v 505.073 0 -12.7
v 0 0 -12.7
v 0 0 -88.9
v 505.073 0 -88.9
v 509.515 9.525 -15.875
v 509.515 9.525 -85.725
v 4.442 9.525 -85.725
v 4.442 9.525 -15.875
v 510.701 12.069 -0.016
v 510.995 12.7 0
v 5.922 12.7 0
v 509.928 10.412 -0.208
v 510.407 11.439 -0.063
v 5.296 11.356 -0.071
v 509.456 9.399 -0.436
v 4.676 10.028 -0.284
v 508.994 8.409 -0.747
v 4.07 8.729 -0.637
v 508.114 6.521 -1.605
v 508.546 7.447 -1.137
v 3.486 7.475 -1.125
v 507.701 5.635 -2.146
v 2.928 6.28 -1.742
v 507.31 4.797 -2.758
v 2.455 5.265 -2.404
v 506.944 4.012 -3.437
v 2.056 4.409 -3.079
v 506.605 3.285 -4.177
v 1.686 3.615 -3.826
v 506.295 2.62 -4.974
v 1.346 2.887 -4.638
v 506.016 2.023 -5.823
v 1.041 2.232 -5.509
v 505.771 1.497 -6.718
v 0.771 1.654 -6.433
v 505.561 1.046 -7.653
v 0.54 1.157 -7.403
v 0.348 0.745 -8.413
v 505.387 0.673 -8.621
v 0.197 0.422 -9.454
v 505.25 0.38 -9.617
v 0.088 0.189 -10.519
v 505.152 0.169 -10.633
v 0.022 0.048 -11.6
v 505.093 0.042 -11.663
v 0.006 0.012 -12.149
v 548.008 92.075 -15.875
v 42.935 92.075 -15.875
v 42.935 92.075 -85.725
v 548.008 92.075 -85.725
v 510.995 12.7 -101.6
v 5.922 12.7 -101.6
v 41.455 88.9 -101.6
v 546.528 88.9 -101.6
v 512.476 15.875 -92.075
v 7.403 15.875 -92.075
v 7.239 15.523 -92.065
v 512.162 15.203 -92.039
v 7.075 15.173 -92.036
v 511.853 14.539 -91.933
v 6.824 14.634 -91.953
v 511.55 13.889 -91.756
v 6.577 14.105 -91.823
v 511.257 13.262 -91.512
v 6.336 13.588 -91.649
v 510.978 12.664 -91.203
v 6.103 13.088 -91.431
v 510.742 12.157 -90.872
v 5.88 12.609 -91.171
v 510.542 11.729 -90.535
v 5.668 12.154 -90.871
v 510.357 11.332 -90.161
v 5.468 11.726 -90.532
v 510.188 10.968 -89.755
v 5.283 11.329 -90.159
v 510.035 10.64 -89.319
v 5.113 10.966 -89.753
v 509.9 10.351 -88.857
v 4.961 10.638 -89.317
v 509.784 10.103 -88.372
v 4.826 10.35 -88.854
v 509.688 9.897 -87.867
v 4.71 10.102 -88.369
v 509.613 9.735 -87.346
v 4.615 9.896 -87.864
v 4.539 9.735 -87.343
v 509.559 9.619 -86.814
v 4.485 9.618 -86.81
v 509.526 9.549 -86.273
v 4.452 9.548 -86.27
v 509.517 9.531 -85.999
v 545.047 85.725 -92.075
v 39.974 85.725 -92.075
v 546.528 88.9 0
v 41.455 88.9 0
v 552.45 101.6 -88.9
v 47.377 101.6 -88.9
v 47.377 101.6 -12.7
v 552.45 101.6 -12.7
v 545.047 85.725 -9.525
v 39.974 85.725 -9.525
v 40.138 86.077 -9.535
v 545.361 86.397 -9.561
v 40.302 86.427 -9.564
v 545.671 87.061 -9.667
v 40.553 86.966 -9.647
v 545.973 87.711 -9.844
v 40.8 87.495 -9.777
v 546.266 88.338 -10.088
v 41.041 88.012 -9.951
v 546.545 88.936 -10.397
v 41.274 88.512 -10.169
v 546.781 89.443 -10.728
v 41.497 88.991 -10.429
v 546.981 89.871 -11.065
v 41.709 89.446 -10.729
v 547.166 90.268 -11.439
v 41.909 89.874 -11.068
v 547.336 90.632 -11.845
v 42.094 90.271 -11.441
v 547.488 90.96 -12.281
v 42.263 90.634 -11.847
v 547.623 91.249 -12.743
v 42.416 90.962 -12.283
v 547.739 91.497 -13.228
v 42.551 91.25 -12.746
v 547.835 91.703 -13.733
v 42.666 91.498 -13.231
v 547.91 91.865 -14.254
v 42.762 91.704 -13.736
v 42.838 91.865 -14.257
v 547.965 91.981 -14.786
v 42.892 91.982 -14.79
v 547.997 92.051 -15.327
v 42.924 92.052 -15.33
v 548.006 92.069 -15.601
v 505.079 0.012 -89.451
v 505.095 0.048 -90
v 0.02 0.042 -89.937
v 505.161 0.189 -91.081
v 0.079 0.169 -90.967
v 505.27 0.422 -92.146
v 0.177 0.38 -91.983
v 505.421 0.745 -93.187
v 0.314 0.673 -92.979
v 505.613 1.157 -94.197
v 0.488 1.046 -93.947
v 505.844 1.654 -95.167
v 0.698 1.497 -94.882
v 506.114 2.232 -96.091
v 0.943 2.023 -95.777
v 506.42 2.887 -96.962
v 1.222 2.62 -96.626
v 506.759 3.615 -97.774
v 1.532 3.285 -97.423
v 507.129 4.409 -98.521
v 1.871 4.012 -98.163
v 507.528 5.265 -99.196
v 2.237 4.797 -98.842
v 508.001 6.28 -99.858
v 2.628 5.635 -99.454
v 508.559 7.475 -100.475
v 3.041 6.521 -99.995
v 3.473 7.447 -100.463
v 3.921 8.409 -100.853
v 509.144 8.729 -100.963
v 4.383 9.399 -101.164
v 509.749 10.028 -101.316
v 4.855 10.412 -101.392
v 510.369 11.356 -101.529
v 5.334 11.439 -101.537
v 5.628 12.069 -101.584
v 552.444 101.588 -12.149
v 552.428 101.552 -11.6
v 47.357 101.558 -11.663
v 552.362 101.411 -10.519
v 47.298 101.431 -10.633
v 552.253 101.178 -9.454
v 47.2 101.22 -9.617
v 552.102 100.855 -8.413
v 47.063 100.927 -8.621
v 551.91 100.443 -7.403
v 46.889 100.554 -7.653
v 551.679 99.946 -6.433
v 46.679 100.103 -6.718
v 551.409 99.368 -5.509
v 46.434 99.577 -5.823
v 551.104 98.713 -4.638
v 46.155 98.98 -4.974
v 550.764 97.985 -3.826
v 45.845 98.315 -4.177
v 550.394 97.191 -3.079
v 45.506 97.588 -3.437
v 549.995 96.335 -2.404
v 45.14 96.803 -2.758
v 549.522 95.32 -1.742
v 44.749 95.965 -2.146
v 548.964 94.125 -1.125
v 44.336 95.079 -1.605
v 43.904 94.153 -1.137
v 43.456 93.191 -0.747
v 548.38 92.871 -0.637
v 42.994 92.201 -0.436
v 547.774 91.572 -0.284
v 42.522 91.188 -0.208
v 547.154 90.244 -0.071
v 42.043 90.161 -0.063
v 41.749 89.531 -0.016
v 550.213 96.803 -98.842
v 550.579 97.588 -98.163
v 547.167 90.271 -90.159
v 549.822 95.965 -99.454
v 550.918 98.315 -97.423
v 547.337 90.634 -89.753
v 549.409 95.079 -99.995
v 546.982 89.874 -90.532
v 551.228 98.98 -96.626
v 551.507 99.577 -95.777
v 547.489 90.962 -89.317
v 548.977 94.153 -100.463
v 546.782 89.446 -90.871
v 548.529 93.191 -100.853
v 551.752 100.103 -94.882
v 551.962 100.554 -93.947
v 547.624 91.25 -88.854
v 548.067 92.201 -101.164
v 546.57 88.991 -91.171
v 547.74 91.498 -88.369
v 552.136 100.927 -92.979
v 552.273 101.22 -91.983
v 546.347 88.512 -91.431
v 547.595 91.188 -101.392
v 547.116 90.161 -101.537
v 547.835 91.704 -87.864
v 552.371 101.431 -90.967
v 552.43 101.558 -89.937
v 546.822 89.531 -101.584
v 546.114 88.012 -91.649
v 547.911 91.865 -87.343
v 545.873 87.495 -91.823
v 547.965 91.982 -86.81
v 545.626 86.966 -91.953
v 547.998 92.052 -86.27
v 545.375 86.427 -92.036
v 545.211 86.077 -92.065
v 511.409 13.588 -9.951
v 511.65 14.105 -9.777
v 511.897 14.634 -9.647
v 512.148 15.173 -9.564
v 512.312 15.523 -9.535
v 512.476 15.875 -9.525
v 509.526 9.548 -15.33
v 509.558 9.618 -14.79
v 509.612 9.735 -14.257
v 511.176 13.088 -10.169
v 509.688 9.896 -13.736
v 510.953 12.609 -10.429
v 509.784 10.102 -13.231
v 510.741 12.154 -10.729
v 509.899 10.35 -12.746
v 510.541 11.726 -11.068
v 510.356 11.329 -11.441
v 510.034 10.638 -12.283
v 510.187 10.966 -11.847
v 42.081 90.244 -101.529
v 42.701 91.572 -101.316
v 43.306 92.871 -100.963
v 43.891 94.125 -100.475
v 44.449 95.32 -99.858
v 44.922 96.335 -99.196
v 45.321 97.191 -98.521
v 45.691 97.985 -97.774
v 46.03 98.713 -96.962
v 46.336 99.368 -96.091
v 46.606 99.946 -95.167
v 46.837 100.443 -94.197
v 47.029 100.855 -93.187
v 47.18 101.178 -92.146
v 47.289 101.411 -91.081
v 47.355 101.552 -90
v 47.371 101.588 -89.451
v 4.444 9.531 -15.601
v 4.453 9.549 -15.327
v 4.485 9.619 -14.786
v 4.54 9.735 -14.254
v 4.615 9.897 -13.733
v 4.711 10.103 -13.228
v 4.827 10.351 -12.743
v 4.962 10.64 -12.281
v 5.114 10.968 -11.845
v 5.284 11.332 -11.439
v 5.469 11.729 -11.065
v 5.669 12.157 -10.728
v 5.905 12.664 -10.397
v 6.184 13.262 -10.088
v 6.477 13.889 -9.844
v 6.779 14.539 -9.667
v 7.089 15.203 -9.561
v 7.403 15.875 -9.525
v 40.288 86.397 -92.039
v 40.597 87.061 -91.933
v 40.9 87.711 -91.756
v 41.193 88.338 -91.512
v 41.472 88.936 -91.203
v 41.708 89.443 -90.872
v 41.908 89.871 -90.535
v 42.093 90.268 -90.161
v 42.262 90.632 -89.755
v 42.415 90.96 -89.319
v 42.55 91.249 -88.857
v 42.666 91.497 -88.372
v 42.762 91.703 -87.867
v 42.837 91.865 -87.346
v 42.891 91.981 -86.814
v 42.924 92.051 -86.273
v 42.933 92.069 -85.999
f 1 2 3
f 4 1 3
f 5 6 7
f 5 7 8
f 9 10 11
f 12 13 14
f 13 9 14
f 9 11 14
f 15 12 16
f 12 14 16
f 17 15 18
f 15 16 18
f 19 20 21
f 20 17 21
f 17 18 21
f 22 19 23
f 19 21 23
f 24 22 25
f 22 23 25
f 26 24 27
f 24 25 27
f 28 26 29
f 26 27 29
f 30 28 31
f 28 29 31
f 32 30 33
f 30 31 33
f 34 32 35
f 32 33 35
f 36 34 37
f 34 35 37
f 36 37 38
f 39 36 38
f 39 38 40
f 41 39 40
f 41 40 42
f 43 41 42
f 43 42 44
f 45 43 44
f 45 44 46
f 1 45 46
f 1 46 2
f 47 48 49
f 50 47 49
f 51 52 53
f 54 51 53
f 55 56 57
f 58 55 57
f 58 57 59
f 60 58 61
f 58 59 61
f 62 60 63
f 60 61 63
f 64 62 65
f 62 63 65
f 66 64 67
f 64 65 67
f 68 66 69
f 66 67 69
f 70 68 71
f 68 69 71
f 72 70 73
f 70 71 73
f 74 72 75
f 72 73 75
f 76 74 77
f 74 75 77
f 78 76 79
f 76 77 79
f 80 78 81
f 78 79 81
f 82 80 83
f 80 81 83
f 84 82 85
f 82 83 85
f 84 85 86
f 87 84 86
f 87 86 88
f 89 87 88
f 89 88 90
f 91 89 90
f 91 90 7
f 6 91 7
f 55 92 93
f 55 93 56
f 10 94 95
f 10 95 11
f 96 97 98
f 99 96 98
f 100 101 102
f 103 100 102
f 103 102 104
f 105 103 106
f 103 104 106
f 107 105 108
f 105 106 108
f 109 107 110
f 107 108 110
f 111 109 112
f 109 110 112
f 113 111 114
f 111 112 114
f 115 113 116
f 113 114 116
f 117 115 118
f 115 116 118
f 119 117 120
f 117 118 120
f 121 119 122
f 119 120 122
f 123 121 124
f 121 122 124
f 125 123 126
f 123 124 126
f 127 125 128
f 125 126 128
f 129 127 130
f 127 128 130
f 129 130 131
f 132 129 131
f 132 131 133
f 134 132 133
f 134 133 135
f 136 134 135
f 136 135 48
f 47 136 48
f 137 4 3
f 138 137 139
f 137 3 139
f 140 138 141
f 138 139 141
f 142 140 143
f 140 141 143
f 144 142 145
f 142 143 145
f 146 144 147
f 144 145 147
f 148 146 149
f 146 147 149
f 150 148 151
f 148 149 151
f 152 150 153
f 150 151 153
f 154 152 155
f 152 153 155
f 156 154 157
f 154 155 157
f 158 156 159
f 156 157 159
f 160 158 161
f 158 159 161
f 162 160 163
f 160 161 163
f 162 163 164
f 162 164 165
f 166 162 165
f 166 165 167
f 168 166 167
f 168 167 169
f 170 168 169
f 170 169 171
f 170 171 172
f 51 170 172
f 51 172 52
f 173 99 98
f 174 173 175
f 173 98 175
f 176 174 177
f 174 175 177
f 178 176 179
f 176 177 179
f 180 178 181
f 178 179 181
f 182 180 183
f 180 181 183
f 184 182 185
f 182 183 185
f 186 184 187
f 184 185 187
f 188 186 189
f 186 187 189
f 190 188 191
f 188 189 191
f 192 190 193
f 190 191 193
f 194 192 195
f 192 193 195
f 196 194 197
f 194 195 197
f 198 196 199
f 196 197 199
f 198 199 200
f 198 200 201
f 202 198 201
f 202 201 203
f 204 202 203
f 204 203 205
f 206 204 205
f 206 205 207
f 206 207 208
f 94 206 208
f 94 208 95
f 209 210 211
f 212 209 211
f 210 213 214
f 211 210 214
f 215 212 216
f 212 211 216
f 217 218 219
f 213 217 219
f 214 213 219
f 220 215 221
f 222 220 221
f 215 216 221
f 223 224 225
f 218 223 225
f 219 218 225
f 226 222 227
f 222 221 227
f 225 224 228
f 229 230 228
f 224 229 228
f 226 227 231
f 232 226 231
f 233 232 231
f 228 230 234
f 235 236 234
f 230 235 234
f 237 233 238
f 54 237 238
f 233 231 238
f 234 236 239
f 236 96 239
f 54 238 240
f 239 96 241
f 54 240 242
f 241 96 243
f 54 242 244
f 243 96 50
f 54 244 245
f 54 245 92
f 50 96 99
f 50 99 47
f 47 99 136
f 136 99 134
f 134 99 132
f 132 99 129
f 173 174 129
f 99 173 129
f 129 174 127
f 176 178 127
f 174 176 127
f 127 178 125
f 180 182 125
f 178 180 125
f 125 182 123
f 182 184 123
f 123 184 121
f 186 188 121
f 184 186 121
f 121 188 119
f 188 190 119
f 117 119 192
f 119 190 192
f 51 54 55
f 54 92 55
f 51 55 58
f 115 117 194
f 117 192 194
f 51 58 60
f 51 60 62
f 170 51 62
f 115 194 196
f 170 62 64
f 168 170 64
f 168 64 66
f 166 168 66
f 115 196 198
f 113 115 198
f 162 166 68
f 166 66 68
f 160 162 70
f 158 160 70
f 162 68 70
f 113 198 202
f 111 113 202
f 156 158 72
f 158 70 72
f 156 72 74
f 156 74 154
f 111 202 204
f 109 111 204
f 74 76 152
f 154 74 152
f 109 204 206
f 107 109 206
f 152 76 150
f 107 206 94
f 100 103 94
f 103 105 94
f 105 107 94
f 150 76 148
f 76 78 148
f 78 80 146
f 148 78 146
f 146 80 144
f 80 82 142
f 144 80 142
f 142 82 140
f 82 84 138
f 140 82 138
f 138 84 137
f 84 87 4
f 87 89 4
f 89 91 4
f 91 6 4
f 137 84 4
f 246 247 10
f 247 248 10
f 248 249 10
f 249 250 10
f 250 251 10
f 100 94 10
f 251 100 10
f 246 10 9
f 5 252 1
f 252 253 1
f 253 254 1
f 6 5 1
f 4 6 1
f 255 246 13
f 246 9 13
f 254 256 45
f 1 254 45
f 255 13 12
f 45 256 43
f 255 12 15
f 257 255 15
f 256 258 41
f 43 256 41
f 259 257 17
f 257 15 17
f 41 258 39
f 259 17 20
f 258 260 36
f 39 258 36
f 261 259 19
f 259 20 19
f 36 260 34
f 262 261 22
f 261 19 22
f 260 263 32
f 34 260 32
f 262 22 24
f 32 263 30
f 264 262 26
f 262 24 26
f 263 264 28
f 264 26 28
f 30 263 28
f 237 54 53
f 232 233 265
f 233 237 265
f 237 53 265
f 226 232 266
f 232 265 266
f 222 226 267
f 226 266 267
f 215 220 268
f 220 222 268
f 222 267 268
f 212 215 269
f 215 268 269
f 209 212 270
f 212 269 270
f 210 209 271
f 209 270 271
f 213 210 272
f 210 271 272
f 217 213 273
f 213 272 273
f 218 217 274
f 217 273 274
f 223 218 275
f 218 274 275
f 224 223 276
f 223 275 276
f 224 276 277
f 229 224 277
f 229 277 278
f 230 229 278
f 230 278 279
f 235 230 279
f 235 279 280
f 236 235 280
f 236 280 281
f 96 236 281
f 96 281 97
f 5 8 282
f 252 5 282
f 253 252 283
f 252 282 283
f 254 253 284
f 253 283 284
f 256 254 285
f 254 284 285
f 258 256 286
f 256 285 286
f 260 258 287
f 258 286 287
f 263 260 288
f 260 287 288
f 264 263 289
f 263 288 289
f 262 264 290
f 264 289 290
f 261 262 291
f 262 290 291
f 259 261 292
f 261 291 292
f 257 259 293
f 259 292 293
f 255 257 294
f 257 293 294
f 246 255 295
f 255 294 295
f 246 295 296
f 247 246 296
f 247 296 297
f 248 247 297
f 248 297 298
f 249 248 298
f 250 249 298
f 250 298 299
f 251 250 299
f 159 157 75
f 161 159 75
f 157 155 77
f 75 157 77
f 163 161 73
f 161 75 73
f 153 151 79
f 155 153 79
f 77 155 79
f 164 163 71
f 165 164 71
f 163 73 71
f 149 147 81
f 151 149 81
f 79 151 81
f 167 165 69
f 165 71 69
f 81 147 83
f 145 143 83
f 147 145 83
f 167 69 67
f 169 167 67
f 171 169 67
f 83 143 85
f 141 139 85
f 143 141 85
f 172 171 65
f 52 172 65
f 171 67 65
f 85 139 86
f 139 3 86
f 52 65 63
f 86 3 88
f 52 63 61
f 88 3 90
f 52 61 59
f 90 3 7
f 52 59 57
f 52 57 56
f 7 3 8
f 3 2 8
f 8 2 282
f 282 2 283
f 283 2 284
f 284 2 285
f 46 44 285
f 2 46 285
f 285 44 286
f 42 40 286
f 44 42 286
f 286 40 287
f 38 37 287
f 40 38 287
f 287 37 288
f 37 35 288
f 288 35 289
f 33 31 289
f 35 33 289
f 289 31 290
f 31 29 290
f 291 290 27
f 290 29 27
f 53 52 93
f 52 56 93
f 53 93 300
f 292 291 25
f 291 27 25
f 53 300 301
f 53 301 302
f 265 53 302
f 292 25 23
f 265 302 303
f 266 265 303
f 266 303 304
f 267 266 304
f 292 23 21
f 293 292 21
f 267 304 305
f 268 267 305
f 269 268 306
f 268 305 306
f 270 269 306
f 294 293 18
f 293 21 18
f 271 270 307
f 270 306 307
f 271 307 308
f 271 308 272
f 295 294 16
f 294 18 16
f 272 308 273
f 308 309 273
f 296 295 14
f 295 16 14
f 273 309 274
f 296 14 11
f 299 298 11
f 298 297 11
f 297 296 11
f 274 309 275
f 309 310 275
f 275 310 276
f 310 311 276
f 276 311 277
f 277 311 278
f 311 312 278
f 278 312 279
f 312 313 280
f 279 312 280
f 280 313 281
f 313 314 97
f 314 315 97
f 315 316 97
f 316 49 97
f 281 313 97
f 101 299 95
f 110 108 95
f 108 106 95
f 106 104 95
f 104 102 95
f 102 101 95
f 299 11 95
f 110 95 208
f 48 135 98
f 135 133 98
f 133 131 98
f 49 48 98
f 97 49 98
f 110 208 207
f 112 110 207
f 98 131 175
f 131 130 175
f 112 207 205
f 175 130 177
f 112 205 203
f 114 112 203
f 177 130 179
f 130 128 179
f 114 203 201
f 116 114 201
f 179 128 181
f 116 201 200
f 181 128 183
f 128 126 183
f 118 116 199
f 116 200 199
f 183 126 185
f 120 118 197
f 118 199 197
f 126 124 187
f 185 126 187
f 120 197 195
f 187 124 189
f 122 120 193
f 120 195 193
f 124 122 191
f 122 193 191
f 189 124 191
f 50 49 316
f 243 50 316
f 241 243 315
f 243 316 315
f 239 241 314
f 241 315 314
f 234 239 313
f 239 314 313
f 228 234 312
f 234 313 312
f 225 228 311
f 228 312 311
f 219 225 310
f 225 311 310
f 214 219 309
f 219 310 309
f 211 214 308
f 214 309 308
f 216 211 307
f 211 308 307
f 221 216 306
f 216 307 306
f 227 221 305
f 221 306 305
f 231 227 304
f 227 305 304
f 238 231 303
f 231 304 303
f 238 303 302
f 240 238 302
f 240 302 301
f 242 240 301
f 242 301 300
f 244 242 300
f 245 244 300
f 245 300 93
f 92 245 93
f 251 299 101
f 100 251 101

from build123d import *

# Parameters (mm, degrees)
F1_DEPTH = 1651
F3_DEPTH = 127


with BuildPart() as f1:
    # F0 (on Right) → F1 (new body)
    with BuildSketch(Plane.YZ):
        with BuildLine():
            Line((88.9, 0), (12.7, 0))
            ThreePointArc((12.7, 0), (3.719744, -3.719744), (0, -12.7))
            Line((0, -12.7), (0, -88.9))
            ThreePointArc((0, -88.9), (3.719744, -97.880256), (12.7, -101.6))
            Line((12.7, -101.6), (88.9, -101.6))
            ThreePointArc((88.9, -101.6), (97.880256, -97.880256), (101.6, -88.9))
            Line((101.6, -88.9), (101.6, -12.7))
            ThreePointArc((101.6, -12.7), (97.880256, -3.719744), (88.9, 0))
        make_face()
        with BuildLine():
            ThreePointArc((9.525, -15.875), (11.384872, -11.384872), (15.875, -9.525))
            Line((15.875, -9.525), (85.725, -9.525))
            ThreePointArc((85.725, -9.525), (90.215128, -11.384872), (92.075, -15.875))
            Line((92.075, -15.875), (92.075, -85.725))
            ThreePointArc((92.075, -85.725), (90.215128, -90.215128), (85.725, -92.075))
            Line((85.725, -92.075), (15.875, -92.075))
            ThreePointArc((15.875, -92.075), (11.384872, -90.215128), (9.525, -85.725))
            Line((9.525, -85.725), (9.525, -15.875))
        make_face(mode=Mode.SUBTRACT)
    extrude(amount=F1_DEPTH)

    # F2 (on Top) → F3 (cut)
    with BuildSketch(Plane.XY):
        Polygon((505.073142, 0), (1651, 0), (1651, 12.7), (1651, 88.9), (1651, 101.6), (552.45, 101.6), align=None)
        Polygon((0, 12.7), (0, 0), (47.376858, 101.6), (0, 101.6), (0, 88.9), align=None)
    extrude(amount=-F3_DEPTH, mode=Mode.SUBTRACT)


solid = f1.part
